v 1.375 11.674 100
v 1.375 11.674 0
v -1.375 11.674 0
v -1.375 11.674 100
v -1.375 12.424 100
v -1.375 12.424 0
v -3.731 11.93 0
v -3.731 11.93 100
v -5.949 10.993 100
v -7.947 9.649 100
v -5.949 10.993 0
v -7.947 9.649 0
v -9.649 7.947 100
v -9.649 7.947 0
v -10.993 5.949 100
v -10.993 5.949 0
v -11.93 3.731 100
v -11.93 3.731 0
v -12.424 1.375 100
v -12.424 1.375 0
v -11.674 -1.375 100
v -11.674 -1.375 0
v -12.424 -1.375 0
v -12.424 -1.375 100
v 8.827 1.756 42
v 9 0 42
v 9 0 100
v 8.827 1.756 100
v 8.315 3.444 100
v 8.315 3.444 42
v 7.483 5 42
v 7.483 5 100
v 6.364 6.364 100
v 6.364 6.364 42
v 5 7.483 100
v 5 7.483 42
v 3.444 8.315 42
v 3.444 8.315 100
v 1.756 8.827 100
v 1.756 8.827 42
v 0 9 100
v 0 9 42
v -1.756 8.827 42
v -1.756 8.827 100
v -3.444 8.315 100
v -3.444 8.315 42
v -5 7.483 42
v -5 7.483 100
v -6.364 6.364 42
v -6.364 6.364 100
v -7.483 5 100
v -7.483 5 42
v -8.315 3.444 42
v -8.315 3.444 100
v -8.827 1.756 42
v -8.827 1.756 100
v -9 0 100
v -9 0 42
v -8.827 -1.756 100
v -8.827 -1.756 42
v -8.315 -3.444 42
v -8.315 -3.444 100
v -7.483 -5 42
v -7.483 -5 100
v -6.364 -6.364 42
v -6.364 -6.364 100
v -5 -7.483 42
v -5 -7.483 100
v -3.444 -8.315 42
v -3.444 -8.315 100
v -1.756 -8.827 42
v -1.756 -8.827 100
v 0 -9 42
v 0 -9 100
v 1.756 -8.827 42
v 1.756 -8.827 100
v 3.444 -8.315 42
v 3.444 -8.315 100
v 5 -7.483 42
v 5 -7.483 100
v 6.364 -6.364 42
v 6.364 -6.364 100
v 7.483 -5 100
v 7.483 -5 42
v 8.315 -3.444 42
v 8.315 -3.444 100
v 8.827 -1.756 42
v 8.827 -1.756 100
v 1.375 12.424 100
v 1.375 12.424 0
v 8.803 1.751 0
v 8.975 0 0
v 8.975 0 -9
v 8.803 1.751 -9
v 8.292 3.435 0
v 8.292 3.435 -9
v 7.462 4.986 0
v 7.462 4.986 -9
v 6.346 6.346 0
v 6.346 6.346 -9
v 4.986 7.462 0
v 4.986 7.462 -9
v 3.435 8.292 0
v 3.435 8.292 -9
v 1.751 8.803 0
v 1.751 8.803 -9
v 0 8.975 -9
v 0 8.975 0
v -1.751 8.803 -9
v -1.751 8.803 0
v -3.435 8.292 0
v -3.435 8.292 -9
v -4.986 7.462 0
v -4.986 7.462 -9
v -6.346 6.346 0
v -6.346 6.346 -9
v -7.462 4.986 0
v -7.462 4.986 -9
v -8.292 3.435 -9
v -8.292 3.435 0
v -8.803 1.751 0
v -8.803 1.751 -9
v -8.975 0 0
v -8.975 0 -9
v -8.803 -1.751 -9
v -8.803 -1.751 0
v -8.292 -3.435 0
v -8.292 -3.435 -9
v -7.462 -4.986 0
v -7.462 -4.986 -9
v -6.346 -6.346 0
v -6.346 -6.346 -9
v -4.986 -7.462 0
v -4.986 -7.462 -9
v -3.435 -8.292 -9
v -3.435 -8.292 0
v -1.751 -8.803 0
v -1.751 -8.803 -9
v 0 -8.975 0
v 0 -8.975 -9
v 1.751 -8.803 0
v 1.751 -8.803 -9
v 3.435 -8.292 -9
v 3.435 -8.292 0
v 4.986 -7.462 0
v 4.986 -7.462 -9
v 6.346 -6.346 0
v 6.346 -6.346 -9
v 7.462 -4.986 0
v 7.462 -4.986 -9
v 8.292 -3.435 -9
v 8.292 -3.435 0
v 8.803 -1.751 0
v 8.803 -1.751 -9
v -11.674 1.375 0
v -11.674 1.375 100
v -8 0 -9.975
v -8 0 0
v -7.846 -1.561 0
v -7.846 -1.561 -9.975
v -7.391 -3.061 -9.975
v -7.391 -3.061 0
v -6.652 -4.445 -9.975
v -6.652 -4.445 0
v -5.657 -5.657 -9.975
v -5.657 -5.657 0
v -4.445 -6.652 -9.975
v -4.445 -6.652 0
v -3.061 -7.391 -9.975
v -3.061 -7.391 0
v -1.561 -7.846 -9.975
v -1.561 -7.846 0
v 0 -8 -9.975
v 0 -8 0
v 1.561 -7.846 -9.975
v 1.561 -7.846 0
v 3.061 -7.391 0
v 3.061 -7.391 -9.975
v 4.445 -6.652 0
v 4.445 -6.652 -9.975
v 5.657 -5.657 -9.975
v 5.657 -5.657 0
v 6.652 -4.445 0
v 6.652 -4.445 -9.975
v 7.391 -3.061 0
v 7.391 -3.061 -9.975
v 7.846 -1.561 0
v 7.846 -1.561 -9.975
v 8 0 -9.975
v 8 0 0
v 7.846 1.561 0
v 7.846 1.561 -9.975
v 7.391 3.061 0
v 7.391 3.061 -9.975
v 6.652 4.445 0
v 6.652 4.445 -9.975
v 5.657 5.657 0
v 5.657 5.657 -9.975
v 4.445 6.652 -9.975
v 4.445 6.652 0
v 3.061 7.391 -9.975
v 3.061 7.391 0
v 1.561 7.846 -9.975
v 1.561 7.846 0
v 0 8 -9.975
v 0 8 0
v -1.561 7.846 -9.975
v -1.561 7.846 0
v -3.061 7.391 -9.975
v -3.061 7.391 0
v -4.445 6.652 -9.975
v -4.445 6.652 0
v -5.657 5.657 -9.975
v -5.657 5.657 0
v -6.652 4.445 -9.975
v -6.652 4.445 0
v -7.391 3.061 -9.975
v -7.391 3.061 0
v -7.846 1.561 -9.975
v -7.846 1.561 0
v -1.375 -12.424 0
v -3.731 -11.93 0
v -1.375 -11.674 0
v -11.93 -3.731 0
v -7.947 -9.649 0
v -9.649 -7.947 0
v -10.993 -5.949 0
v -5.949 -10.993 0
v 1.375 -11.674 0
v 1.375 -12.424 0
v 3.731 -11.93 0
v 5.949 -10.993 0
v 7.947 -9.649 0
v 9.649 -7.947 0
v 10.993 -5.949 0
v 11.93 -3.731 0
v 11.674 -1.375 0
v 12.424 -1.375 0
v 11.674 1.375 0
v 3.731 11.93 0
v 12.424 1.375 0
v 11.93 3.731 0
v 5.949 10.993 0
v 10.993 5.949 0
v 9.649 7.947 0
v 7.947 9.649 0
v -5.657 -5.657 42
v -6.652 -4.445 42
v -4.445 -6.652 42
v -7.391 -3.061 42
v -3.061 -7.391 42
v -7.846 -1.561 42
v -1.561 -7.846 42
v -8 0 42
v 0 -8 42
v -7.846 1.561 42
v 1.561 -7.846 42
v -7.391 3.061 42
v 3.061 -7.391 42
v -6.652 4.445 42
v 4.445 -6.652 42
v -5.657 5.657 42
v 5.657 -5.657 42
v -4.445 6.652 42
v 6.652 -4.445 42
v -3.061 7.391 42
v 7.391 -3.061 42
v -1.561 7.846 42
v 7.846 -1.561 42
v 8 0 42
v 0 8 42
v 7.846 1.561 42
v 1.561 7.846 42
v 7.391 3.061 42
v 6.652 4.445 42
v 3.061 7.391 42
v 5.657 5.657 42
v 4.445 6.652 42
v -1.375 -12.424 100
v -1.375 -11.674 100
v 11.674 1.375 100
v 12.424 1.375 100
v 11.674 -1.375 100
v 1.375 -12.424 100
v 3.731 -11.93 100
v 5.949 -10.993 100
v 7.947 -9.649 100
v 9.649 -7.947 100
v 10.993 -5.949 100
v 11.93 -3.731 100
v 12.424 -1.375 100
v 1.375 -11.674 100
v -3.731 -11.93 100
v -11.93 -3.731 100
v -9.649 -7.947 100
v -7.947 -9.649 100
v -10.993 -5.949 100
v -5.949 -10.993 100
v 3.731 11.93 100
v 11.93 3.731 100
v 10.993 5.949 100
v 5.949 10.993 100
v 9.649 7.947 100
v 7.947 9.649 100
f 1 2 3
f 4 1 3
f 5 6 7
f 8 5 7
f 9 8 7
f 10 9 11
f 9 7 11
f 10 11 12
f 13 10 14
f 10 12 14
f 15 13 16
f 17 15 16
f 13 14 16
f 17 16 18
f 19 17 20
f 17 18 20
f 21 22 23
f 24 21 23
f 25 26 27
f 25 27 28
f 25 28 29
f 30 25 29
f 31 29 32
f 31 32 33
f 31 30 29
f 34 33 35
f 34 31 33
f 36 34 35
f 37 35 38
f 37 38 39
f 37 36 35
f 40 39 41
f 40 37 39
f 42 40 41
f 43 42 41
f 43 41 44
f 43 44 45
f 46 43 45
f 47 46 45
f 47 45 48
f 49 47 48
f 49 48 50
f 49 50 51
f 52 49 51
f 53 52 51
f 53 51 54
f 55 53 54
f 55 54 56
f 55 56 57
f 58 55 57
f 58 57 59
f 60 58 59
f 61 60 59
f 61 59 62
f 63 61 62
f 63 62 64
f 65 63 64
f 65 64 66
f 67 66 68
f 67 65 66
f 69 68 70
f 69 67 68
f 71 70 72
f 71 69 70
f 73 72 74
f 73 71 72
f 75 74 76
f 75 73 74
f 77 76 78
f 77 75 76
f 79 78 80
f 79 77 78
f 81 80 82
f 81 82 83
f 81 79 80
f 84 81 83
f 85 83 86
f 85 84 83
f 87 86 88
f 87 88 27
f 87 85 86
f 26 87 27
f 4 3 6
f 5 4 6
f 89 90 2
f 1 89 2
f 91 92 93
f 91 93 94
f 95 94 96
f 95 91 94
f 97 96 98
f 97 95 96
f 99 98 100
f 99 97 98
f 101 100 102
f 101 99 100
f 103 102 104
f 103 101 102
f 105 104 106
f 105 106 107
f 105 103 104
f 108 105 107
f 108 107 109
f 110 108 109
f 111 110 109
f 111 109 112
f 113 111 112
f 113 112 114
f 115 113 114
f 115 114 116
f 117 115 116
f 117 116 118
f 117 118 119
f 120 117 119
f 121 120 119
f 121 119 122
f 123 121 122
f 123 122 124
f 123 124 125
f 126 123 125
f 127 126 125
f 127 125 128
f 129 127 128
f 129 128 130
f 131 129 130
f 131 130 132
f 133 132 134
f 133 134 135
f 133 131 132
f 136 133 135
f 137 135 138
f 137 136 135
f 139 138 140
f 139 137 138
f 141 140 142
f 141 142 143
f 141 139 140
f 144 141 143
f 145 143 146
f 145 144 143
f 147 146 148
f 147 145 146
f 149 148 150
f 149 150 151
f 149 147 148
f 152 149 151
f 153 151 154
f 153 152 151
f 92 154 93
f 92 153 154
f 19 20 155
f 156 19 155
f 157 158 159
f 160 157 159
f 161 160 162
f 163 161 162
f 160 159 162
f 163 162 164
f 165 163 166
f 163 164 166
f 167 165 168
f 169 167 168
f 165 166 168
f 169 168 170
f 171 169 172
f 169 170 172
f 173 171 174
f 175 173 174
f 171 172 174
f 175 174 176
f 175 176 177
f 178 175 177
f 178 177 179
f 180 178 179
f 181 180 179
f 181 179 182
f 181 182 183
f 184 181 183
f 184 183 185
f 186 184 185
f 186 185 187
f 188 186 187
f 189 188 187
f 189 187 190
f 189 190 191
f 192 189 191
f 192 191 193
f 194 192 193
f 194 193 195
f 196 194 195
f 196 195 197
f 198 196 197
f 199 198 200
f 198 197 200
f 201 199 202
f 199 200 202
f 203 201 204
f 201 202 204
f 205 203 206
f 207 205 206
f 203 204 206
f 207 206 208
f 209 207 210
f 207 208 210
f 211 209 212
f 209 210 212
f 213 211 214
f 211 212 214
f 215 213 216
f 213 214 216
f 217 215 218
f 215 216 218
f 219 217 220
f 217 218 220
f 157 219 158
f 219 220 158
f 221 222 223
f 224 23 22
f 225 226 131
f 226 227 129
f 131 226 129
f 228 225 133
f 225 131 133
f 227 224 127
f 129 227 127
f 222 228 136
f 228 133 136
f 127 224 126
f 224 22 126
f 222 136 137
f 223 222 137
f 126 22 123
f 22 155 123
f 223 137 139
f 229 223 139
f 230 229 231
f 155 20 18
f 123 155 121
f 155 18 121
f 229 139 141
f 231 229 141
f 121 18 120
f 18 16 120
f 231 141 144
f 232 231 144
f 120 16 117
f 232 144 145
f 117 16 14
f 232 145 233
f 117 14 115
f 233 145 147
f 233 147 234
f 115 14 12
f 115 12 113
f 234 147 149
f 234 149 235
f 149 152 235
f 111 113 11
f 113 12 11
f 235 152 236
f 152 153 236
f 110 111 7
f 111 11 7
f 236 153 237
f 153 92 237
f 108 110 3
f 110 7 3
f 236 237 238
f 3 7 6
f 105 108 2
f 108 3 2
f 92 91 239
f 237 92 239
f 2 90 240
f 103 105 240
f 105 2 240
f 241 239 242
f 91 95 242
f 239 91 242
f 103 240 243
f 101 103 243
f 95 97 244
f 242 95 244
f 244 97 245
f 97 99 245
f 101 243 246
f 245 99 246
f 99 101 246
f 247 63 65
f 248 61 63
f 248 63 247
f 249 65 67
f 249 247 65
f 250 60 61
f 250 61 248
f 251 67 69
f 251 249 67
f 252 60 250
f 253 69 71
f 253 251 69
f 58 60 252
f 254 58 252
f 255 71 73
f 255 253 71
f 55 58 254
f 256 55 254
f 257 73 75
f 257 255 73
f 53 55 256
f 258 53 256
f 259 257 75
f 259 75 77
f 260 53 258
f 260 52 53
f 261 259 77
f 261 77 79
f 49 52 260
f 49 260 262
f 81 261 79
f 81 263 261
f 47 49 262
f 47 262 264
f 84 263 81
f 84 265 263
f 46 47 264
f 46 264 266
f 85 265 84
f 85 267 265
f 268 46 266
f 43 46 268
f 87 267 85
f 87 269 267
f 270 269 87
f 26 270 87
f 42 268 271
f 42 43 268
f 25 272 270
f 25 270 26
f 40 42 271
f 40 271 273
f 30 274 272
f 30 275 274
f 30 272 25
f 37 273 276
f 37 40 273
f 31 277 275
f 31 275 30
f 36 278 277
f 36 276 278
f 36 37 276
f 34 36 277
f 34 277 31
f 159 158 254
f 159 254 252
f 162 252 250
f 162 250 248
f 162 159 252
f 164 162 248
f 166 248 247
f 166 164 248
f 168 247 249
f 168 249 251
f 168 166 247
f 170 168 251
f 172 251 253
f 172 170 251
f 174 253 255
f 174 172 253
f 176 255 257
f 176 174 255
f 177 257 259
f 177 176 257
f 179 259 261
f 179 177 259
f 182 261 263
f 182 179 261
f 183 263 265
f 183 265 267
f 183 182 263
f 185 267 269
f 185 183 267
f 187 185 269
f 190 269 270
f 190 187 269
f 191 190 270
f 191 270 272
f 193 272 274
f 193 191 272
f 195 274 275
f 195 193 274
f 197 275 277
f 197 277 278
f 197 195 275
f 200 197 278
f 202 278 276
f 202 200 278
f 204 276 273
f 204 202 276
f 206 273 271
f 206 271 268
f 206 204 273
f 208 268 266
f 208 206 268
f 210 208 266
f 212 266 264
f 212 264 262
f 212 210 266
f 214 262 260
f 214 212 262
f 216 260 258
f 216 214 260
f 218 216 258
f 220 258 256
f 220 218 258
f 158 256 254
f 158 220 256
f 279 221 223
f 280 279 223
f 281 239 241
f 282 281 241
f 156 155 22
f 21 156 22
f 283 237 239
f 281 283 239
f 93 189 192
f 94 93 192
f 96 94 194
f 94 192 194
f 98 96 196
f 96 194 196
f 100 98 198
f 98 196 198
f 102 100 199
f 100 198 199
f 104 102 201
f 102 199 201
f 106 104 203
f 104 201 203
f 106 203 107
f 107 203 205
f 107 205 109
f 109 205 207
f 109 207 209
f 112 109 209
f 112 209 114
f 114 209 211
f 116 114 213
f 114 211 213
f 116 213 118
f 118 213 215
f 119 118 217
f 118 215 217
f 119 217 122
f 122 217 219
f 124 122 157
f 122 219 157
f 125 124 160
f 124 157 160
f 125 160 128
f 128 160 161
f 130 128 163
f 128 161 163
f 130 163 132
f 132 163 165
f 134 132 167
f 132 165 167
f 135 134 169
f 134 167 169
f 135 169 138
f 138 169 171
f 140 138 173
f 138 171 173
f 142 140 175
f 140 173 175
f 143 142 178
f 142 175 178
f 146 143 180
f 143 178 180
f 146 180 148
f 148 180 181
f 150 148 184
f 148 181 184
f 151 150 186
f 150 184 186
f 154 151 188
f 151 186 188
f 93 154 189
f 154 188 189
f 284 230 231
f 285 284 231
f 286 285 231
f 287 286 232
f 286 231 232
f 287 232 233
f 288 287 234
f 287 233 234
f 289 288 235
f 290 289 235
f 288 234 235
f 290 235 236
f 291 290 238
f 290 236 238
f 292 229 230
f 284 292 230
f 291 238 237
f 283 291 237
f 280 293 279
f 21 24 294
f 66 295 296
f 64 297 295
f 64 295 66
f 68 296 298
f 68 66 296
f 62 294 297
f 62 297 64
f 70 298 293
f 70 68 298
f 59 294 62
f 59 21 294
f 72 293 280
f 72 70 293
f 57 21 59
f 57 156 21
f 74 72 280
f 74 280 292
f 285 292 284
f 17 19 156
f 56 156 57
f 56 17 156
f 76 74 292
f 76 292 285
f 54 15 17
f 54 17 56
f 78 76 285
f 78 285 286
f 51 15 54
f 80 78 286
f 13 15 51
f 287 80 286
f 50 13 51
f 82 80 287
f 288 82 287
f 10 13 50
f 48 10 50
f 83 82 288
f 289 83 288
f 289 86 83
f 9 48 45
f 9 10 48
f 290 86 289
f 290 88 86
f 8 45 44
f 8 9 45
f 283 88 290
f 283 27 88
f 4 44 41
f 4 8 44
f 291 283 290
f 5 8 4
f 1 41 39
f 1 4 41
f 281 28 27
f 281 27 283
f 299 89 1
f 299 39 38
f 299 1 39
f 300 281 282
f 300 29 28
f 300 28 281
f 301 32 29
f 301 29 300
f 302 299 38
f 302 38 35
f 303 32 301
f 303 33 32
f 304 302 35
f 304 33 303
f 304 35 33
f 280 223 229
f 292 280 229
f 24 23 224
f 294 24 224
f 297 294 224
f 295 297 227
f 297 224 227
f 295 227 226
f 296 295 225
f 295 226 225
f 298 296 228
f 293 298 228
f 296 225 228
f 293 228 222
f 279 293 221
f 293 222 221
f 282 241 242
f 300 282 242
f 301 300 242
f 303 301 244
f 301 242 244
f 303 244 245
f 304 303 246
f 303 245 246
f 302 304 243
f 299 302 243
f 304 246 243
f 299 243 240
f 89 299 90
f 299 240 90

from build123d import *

# Parameters (mm, degrees)
F0_R     = 9
F1_DEPTH = 100
F2_R     = 9
F2_R_2   = 8
F3_DEPTH = 42
F4_R     = 8.975
F5_DEPTH = 10
F7_D     = 16


# Not quite as in the source:
# - a fillet or chamfer that OpenCascade refuses, or shapes differently, is made with other operations: its cross-section is extruded or revolved along the edge and cut away or added


with BuildPart() as f1:
    # F0 (on Top) → F1 (new body)
    with BuildSketch(Plane.XY):
        with BuildLine():
            Line((11.6741448398, 1.375), (12.4241448398, 1.375))
            ThreePointArc((12.4241448398, 1.375), (8.8388347648, 8.8388347648), (1.375, 12.4241448398))
            Line((1.375, 12.4241448398), (1.375, 11.6741448398))
            Line((1.375, 11.6741448398), (-1.375, 11.6741448398))
            Line((-1.375, 11.6741448398), (-1.375, 12.4241448398))
            ThreePointArc((-1.375, 12.4241448398), (-8.8388347648, 8.8388347648), (-12.4241448398, 1.375))
            Line((-12.4241448398, 1.375), (-11.6741448398, 1.375))
            Line((-11.6741448398, 1.375), (-11.6741448398, -1.375))
            Line((-11.6741448398, -1.375), (-12.4241448398, -1.375))
            ThreePointArc((-12.4241448398, -1.375), (-8.8388347648, -8.8388347648), (-1.375, -12.4241448398))
            Line((-1.375, -12.4241448398), (-1.375, -11.6741448398))
            Line((-1.375, -11.6741448398), (1.375, -11.6741448398))
            Line((1.375, -11.6741448398), (1.375, -12.4241448398))
            ThreePointArc((1.375, -12.4241448398), (8.8388347648, -8.8388347648), (12.4241448398, -1.375))
            Line((12.4241448398, -1.375), (11.6741448398, -1.375))
            Line((11.6741448398, -1.375), (11.6741448398, 1.375))
        make_face()
        Circle(F0_R, mode=Mode.SUBTRACT)
    extrude(amount=F1_DEPTH)

    # F2 (on Top) → F3 (join)
    with BuildSketch(Plane.XY):
        Circle(F2_R)
        Circle(F2_R_2, mode=Mode.SUBTRACT)
    extrude(amount=F3_DEPTH)

    # F4 (on Top) → F5 (join)
    with BuildSketch(Plane.XY):
        Circle(F4_R)
    extrude(amount=-F5_DEPTH)

    # F7 (through all)
    with Locations(Plane(origin=(0, 0, -10), x_dir=(1, 0, 0), z_dir=(0, 0, -1))):
        with Locations((0, 0)):
            Hole(F7_D / 2)

    # F8: chamfer of 1 on 1 edges, made by hand

    # F8_s1 → F8_t2 (revolve, cut)
    with BuildSketch(Plane.XZ):
        Polygon((8.975, -9), (7.975, -10), (8.975, -10), align=None)
    revolve(axis=Axis((0, 0, -10), (0, 0, 1)), mode=Mode.SUBTRACT)


solid = f1.part
